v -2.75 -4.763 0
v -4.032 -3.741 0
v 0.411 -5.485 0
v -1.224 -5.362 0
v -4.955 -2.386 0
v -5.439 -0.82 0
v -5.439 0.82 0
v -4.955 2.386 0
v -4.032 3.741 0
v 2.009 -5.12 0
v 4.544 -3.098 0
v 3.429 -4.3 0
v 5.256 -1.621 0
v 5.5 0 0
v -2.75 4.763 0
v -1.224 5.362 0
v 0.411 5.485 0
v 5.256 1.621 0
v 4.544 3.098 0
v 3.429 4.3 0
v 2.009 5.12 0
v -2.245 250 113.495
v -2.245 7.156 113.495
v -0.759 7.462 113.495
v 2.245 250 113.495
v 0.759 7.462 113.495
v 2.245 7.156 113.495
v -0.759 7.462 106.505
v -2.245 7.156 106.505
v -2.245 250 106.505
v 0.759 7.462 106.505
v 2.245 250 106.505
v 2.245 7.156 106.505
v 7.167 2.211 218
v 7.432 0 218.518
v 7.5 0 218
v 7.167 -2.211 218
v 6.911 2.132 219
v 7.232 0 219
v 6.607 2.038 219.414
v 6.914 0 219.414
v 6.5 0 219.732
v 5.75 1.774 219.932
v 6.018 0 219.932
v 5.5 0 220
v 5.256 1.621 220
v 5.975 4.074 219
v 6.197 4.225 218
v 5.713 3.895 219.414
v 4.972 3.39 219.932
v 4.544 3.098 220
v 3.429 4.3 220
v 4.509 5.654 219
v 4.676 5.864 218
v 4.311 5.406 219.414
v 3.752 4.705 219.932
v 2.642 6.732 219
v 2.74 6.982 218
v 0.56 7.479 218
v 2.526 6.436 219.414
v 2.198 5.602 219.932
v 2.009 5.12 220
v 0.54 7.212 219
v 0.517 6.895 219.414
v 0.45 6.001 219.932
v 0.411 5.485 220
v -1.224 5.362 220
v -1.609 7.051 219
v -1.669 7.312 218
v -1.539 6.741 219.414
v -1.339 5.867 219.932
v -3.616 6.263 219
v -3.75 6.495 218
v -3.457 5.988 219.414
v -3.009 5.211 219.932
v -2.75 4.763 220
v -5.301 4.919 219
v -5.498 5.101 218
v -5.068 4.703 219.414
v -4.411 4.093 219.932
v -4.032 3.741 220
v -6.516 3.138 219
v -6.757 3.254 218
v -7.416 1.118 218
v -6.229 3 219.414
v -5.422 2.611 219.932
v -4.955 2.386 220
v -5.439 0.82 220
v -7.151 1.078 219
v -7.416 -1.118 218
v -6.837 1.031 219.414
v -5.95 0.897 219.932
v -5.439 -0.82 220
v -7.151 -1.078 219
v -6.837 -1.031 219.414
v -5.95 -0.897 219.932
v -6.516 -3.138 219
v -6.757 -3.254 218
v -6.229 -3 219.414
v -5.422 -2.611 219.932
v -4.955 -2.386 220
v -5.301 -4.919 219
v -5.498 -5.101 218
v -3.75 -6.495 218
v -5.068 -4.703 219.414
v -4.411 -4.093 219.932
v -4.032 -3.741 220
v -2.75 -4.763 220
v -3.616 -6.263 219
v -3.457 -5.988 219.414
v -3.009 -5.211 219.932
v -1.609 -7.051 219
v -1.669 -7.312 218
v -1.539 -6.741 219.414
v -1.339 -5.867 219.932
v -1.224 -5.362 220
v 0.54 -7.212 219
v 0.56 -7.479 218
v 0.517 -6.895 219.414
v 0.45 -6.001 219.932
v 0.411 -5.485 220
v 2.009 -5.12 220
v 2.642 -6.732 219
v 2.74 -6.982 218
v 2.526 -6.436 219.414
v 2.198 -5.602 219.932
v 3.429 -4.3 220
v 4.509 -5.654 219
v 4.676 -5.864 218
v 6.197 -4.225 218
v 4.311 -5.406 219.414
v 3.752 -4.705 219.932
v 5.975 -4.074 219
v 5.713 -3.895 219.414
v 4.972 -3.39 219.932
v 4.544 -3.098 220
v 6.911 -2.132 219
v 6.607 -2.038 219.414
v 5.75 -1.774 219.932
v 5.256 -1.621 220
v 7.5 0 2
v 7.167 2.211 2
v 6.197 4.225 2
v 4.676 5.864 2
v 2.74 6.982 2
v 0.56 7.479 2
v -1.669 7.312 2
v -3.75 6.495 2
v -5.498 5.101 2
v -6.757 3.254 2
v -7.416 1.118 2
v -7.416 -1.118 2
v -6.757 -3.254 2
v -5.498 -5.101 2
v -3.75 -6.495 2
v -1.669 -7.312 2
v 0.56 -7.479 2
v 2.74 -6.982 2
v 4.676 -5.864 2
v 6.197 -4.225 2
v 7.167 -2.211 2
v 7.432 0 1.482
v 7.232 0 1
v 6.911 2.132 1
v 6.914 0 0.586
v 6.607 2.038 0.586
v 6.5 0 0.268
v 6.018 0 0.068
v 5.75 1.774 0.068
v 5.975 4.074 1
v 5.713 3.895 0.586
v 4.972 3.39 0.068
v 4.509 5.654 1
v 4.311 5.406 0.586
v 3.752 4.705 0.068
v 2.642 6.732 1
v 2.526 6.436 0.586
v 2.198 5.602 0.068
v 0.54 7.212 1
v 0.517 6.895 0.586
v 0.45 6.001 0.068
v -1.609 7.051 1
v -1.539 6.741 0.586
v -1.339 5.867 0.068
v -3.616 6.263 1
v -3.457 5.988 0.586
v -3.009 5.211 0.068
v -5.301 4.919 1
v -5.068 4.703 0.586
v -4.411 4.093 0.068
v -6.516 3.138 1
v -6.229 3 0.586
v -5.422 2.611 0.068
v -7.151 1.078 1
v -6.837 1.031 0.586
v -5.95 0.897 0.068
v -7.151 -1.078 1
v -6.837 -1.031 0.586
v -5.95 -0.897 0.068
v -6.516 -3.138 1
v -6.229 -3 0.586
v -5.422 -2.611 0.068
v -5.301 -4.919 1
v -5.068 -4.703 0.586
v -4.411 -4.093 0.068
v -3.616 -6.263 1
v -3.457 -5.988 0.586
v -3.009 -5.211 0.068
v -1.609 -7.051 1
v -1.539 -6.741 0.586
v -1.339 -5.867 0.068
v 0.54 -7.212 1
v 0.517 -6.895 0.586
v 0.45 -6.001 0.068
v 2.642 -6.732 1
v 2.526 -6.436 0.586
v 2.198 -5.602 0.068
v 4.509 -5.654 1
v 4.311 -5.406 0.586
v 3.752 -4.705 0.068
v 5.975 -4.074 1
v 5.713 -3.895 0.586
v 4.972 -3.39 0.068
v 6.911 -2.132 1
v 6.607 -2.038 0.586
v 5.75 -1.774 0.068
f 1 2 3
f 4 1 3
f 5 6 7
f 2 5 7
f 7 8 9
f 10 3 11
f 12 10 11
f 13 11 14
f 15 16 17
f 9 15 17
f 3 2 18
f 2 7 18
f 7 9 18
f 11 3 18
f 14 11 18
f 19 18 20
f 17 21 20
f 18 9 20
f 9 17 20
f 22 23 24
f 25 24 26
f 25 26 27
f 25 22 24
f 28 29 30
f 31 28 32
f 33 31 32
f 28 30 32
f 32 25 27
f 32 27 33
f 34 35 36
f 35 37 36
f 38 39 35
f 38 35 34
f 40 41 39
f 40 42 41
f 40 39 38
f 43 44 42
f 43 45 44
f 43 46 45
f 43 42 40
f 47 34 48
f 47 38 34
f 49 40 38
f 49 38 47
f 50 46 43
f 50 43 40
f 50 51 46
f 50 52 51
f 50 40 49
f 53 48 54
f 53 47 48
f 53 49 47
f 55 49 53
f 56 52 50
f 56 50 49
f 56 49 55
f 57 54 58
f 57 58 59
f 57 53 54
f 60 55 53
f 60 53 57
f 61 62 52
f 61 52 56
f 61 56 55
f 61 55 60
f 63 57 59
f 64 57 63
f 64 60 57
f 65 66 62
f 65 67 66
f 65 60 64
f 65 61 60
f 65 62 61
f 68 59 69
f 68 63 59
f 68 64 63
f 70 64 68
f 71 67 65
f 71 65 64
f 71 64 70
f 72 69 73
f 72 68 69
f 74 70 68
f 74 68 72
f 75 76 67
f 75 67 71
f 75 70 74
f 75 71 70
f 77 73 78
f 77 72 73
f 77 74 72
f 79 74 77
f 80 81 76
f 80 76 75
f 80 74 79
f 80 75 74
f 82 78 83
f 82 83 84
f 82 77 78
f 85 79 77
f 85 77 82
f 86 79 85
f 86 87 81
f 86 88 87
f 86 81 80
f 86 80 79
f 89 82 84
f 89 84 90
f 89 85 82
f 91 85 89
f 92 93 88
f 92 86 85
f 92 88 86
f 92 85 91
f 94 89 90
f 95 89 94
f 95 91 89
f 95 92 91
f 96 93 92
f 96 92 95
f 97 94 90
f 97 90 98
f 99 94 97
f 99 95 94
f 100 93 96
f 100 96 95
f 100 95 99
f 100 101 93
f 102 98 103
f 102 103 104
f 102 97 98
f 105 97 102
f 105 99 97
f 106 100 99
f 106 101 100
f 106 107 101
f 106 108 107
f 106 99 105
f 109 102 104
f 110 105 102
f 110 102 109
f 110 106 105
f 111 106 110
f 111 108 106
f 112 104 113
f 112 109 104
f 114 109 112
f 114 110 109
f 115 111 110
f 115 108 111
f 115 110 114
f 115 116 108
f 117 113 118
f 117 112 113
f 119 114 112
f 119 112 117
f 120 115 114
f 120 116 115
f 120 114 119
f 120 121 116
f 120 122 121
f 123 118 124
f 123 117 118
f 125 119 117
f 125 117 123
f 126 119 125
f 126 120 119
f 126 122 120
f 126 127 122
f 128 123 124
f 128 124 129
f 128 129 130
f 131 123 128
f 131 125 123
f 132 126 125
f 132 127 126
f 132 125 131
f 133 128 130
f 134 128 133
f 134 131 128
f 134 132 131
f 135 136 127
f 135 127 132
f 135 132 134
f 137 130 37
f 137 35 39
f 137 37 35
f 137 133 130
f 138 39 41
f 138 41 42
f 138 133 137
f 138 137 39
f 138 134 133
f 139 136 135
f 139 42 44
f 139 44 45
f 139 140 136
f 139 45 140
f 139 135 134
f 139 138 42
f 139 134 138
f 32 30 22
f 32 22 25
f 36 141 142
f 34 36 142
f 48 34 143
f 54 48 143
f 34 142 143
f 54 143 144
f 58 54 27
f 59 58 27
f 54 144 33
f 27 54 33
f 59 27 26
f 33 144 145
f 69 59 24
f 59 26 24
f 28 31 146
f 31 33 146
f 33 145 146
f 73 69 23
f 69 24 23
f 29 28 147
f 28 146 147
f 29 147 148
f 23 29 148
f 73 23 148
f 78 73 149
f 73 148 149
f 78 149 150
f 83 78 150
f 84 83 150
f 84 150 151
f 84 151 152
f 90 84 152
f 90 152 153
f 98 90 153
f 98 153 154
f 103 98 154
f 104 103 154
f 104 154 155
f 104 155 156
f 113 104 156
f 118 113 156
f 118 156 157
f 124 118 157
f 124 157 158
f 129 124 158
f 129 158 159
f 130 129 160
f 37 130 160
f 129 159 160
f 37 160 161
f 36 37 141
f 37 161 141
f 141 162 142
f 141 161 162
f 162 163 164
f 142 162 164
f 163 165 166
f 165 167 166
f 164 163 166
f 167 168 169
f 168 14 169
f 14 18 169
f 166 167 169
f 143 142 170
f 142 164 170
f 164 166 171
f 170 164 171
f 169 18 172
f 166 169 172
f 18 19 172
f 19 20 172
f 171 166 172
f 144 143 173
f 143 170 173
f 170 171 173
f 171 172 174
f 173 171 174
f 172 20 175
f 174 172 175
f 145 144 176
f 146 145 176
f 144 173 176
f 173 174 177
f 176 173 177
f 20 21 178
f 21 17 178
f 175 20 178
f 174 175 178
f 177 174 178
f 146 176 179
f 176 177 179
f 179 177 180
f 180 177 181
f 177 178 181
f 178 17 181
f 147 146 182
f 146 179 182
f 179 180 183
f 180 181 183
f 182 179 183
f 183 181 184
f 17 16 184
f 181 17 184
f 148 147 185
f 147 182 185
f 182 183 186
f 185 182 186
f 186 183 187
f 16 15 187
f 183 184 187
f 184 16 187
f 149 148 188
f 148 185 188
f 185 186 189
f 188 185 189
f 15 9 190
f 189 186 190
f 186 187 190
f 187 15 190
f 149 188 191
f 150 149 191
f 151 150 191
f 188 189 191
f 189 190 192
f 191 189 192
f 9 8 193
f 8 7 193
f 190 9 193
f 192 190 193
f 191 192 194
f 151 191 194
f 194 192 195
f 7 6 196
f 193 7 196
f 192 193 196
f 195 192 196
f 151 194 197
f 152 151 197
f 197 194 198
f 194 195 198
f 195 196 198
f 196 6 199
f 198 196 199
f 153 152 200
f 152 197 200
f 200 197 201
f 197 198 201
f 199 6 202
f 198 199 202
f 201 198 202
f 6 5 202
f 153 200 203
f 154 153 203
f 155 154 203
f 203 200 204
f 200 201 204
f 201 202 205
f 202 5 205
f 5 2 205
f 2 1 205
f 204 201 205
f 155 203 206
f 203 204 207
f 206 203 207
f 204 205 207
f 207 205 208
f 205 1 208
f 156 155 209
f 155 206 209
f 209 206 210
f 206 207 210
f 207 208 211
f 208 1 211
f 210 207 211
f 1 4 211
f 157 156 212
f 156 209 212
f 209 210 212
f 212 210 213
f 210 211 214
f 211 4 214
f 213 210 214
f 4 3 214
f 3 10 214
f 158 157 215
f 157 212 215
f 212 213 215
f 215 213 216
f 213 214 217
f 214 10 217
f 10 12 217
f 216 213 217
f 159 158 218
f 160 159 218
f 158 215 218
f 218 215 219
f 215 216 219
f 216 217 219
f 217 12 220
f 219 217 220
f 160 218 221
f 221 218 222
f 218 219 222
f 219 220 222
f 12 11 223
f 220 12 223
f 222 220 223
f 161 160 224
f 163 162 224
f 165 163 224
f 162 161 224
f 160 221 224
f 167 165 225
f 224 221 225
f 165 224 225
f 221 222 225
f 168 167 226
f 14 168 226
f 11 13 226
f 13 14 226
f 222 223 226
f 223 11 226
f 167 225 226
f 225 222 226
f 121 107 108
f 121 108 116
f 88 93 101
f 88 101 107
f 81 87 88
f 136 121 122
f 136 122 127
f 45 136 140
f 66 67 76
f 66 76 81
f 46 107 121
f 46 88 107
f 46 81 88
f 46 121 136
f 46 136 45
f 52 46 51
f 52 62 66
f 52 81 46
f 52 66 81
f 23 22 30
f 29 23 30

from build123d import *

# Parameters (mm, degrees)
SKETCH1_R           = 7.5
BOSS_EXTRUDE1_DEPTH = 220
FILLET1_R           = 2
BOSS_EXTRUDE2_REACH = 259.5
SKETCH3_W           = 4.49
SKETCH3_H           = 6.99


with BuildPart() as part:
    # Sketch1 → Boss-Extrude1 (new body)
    with BuildSketch(Plane.XY):
        Circle(SKETCH1_R)
    extrude(amount=BOSS_EXTRUDE1_DEPTH)

    # Fillet1
    fillet1_edges = [part.edges().sort_by_distance(p)[0] for p in [
        (-7.5, 0, 0),
        (-7.5, 0, 220),
    ]]
    fillet(fillet1_edges, radius=FILLET1_R)

    # Sketch3 → Boss-Extrude2 (add, up to next)
    with BuildSketch(Plane(origin=(0, 250, 0), x_dir=(1, 0, 0), z_dir=(0, 1, 0)), mode=Mode.PRIVATE) as boss_extrude2_sk1:
        with Locations((0, -110)):
            Rectangle(SKETCH3_W, SKETCH3_H)
    boss_extrude2_tool1 = extrude(boss_extrude2_sk1.sketch, amount=-BOSS_EXTRUDE2_REACH, mode=Mode.PRIVATE) - part.part
    add(boss_extrude2_tool1.solids().sort_by_distance((0, 250, 110))[0])


solid = part.part
